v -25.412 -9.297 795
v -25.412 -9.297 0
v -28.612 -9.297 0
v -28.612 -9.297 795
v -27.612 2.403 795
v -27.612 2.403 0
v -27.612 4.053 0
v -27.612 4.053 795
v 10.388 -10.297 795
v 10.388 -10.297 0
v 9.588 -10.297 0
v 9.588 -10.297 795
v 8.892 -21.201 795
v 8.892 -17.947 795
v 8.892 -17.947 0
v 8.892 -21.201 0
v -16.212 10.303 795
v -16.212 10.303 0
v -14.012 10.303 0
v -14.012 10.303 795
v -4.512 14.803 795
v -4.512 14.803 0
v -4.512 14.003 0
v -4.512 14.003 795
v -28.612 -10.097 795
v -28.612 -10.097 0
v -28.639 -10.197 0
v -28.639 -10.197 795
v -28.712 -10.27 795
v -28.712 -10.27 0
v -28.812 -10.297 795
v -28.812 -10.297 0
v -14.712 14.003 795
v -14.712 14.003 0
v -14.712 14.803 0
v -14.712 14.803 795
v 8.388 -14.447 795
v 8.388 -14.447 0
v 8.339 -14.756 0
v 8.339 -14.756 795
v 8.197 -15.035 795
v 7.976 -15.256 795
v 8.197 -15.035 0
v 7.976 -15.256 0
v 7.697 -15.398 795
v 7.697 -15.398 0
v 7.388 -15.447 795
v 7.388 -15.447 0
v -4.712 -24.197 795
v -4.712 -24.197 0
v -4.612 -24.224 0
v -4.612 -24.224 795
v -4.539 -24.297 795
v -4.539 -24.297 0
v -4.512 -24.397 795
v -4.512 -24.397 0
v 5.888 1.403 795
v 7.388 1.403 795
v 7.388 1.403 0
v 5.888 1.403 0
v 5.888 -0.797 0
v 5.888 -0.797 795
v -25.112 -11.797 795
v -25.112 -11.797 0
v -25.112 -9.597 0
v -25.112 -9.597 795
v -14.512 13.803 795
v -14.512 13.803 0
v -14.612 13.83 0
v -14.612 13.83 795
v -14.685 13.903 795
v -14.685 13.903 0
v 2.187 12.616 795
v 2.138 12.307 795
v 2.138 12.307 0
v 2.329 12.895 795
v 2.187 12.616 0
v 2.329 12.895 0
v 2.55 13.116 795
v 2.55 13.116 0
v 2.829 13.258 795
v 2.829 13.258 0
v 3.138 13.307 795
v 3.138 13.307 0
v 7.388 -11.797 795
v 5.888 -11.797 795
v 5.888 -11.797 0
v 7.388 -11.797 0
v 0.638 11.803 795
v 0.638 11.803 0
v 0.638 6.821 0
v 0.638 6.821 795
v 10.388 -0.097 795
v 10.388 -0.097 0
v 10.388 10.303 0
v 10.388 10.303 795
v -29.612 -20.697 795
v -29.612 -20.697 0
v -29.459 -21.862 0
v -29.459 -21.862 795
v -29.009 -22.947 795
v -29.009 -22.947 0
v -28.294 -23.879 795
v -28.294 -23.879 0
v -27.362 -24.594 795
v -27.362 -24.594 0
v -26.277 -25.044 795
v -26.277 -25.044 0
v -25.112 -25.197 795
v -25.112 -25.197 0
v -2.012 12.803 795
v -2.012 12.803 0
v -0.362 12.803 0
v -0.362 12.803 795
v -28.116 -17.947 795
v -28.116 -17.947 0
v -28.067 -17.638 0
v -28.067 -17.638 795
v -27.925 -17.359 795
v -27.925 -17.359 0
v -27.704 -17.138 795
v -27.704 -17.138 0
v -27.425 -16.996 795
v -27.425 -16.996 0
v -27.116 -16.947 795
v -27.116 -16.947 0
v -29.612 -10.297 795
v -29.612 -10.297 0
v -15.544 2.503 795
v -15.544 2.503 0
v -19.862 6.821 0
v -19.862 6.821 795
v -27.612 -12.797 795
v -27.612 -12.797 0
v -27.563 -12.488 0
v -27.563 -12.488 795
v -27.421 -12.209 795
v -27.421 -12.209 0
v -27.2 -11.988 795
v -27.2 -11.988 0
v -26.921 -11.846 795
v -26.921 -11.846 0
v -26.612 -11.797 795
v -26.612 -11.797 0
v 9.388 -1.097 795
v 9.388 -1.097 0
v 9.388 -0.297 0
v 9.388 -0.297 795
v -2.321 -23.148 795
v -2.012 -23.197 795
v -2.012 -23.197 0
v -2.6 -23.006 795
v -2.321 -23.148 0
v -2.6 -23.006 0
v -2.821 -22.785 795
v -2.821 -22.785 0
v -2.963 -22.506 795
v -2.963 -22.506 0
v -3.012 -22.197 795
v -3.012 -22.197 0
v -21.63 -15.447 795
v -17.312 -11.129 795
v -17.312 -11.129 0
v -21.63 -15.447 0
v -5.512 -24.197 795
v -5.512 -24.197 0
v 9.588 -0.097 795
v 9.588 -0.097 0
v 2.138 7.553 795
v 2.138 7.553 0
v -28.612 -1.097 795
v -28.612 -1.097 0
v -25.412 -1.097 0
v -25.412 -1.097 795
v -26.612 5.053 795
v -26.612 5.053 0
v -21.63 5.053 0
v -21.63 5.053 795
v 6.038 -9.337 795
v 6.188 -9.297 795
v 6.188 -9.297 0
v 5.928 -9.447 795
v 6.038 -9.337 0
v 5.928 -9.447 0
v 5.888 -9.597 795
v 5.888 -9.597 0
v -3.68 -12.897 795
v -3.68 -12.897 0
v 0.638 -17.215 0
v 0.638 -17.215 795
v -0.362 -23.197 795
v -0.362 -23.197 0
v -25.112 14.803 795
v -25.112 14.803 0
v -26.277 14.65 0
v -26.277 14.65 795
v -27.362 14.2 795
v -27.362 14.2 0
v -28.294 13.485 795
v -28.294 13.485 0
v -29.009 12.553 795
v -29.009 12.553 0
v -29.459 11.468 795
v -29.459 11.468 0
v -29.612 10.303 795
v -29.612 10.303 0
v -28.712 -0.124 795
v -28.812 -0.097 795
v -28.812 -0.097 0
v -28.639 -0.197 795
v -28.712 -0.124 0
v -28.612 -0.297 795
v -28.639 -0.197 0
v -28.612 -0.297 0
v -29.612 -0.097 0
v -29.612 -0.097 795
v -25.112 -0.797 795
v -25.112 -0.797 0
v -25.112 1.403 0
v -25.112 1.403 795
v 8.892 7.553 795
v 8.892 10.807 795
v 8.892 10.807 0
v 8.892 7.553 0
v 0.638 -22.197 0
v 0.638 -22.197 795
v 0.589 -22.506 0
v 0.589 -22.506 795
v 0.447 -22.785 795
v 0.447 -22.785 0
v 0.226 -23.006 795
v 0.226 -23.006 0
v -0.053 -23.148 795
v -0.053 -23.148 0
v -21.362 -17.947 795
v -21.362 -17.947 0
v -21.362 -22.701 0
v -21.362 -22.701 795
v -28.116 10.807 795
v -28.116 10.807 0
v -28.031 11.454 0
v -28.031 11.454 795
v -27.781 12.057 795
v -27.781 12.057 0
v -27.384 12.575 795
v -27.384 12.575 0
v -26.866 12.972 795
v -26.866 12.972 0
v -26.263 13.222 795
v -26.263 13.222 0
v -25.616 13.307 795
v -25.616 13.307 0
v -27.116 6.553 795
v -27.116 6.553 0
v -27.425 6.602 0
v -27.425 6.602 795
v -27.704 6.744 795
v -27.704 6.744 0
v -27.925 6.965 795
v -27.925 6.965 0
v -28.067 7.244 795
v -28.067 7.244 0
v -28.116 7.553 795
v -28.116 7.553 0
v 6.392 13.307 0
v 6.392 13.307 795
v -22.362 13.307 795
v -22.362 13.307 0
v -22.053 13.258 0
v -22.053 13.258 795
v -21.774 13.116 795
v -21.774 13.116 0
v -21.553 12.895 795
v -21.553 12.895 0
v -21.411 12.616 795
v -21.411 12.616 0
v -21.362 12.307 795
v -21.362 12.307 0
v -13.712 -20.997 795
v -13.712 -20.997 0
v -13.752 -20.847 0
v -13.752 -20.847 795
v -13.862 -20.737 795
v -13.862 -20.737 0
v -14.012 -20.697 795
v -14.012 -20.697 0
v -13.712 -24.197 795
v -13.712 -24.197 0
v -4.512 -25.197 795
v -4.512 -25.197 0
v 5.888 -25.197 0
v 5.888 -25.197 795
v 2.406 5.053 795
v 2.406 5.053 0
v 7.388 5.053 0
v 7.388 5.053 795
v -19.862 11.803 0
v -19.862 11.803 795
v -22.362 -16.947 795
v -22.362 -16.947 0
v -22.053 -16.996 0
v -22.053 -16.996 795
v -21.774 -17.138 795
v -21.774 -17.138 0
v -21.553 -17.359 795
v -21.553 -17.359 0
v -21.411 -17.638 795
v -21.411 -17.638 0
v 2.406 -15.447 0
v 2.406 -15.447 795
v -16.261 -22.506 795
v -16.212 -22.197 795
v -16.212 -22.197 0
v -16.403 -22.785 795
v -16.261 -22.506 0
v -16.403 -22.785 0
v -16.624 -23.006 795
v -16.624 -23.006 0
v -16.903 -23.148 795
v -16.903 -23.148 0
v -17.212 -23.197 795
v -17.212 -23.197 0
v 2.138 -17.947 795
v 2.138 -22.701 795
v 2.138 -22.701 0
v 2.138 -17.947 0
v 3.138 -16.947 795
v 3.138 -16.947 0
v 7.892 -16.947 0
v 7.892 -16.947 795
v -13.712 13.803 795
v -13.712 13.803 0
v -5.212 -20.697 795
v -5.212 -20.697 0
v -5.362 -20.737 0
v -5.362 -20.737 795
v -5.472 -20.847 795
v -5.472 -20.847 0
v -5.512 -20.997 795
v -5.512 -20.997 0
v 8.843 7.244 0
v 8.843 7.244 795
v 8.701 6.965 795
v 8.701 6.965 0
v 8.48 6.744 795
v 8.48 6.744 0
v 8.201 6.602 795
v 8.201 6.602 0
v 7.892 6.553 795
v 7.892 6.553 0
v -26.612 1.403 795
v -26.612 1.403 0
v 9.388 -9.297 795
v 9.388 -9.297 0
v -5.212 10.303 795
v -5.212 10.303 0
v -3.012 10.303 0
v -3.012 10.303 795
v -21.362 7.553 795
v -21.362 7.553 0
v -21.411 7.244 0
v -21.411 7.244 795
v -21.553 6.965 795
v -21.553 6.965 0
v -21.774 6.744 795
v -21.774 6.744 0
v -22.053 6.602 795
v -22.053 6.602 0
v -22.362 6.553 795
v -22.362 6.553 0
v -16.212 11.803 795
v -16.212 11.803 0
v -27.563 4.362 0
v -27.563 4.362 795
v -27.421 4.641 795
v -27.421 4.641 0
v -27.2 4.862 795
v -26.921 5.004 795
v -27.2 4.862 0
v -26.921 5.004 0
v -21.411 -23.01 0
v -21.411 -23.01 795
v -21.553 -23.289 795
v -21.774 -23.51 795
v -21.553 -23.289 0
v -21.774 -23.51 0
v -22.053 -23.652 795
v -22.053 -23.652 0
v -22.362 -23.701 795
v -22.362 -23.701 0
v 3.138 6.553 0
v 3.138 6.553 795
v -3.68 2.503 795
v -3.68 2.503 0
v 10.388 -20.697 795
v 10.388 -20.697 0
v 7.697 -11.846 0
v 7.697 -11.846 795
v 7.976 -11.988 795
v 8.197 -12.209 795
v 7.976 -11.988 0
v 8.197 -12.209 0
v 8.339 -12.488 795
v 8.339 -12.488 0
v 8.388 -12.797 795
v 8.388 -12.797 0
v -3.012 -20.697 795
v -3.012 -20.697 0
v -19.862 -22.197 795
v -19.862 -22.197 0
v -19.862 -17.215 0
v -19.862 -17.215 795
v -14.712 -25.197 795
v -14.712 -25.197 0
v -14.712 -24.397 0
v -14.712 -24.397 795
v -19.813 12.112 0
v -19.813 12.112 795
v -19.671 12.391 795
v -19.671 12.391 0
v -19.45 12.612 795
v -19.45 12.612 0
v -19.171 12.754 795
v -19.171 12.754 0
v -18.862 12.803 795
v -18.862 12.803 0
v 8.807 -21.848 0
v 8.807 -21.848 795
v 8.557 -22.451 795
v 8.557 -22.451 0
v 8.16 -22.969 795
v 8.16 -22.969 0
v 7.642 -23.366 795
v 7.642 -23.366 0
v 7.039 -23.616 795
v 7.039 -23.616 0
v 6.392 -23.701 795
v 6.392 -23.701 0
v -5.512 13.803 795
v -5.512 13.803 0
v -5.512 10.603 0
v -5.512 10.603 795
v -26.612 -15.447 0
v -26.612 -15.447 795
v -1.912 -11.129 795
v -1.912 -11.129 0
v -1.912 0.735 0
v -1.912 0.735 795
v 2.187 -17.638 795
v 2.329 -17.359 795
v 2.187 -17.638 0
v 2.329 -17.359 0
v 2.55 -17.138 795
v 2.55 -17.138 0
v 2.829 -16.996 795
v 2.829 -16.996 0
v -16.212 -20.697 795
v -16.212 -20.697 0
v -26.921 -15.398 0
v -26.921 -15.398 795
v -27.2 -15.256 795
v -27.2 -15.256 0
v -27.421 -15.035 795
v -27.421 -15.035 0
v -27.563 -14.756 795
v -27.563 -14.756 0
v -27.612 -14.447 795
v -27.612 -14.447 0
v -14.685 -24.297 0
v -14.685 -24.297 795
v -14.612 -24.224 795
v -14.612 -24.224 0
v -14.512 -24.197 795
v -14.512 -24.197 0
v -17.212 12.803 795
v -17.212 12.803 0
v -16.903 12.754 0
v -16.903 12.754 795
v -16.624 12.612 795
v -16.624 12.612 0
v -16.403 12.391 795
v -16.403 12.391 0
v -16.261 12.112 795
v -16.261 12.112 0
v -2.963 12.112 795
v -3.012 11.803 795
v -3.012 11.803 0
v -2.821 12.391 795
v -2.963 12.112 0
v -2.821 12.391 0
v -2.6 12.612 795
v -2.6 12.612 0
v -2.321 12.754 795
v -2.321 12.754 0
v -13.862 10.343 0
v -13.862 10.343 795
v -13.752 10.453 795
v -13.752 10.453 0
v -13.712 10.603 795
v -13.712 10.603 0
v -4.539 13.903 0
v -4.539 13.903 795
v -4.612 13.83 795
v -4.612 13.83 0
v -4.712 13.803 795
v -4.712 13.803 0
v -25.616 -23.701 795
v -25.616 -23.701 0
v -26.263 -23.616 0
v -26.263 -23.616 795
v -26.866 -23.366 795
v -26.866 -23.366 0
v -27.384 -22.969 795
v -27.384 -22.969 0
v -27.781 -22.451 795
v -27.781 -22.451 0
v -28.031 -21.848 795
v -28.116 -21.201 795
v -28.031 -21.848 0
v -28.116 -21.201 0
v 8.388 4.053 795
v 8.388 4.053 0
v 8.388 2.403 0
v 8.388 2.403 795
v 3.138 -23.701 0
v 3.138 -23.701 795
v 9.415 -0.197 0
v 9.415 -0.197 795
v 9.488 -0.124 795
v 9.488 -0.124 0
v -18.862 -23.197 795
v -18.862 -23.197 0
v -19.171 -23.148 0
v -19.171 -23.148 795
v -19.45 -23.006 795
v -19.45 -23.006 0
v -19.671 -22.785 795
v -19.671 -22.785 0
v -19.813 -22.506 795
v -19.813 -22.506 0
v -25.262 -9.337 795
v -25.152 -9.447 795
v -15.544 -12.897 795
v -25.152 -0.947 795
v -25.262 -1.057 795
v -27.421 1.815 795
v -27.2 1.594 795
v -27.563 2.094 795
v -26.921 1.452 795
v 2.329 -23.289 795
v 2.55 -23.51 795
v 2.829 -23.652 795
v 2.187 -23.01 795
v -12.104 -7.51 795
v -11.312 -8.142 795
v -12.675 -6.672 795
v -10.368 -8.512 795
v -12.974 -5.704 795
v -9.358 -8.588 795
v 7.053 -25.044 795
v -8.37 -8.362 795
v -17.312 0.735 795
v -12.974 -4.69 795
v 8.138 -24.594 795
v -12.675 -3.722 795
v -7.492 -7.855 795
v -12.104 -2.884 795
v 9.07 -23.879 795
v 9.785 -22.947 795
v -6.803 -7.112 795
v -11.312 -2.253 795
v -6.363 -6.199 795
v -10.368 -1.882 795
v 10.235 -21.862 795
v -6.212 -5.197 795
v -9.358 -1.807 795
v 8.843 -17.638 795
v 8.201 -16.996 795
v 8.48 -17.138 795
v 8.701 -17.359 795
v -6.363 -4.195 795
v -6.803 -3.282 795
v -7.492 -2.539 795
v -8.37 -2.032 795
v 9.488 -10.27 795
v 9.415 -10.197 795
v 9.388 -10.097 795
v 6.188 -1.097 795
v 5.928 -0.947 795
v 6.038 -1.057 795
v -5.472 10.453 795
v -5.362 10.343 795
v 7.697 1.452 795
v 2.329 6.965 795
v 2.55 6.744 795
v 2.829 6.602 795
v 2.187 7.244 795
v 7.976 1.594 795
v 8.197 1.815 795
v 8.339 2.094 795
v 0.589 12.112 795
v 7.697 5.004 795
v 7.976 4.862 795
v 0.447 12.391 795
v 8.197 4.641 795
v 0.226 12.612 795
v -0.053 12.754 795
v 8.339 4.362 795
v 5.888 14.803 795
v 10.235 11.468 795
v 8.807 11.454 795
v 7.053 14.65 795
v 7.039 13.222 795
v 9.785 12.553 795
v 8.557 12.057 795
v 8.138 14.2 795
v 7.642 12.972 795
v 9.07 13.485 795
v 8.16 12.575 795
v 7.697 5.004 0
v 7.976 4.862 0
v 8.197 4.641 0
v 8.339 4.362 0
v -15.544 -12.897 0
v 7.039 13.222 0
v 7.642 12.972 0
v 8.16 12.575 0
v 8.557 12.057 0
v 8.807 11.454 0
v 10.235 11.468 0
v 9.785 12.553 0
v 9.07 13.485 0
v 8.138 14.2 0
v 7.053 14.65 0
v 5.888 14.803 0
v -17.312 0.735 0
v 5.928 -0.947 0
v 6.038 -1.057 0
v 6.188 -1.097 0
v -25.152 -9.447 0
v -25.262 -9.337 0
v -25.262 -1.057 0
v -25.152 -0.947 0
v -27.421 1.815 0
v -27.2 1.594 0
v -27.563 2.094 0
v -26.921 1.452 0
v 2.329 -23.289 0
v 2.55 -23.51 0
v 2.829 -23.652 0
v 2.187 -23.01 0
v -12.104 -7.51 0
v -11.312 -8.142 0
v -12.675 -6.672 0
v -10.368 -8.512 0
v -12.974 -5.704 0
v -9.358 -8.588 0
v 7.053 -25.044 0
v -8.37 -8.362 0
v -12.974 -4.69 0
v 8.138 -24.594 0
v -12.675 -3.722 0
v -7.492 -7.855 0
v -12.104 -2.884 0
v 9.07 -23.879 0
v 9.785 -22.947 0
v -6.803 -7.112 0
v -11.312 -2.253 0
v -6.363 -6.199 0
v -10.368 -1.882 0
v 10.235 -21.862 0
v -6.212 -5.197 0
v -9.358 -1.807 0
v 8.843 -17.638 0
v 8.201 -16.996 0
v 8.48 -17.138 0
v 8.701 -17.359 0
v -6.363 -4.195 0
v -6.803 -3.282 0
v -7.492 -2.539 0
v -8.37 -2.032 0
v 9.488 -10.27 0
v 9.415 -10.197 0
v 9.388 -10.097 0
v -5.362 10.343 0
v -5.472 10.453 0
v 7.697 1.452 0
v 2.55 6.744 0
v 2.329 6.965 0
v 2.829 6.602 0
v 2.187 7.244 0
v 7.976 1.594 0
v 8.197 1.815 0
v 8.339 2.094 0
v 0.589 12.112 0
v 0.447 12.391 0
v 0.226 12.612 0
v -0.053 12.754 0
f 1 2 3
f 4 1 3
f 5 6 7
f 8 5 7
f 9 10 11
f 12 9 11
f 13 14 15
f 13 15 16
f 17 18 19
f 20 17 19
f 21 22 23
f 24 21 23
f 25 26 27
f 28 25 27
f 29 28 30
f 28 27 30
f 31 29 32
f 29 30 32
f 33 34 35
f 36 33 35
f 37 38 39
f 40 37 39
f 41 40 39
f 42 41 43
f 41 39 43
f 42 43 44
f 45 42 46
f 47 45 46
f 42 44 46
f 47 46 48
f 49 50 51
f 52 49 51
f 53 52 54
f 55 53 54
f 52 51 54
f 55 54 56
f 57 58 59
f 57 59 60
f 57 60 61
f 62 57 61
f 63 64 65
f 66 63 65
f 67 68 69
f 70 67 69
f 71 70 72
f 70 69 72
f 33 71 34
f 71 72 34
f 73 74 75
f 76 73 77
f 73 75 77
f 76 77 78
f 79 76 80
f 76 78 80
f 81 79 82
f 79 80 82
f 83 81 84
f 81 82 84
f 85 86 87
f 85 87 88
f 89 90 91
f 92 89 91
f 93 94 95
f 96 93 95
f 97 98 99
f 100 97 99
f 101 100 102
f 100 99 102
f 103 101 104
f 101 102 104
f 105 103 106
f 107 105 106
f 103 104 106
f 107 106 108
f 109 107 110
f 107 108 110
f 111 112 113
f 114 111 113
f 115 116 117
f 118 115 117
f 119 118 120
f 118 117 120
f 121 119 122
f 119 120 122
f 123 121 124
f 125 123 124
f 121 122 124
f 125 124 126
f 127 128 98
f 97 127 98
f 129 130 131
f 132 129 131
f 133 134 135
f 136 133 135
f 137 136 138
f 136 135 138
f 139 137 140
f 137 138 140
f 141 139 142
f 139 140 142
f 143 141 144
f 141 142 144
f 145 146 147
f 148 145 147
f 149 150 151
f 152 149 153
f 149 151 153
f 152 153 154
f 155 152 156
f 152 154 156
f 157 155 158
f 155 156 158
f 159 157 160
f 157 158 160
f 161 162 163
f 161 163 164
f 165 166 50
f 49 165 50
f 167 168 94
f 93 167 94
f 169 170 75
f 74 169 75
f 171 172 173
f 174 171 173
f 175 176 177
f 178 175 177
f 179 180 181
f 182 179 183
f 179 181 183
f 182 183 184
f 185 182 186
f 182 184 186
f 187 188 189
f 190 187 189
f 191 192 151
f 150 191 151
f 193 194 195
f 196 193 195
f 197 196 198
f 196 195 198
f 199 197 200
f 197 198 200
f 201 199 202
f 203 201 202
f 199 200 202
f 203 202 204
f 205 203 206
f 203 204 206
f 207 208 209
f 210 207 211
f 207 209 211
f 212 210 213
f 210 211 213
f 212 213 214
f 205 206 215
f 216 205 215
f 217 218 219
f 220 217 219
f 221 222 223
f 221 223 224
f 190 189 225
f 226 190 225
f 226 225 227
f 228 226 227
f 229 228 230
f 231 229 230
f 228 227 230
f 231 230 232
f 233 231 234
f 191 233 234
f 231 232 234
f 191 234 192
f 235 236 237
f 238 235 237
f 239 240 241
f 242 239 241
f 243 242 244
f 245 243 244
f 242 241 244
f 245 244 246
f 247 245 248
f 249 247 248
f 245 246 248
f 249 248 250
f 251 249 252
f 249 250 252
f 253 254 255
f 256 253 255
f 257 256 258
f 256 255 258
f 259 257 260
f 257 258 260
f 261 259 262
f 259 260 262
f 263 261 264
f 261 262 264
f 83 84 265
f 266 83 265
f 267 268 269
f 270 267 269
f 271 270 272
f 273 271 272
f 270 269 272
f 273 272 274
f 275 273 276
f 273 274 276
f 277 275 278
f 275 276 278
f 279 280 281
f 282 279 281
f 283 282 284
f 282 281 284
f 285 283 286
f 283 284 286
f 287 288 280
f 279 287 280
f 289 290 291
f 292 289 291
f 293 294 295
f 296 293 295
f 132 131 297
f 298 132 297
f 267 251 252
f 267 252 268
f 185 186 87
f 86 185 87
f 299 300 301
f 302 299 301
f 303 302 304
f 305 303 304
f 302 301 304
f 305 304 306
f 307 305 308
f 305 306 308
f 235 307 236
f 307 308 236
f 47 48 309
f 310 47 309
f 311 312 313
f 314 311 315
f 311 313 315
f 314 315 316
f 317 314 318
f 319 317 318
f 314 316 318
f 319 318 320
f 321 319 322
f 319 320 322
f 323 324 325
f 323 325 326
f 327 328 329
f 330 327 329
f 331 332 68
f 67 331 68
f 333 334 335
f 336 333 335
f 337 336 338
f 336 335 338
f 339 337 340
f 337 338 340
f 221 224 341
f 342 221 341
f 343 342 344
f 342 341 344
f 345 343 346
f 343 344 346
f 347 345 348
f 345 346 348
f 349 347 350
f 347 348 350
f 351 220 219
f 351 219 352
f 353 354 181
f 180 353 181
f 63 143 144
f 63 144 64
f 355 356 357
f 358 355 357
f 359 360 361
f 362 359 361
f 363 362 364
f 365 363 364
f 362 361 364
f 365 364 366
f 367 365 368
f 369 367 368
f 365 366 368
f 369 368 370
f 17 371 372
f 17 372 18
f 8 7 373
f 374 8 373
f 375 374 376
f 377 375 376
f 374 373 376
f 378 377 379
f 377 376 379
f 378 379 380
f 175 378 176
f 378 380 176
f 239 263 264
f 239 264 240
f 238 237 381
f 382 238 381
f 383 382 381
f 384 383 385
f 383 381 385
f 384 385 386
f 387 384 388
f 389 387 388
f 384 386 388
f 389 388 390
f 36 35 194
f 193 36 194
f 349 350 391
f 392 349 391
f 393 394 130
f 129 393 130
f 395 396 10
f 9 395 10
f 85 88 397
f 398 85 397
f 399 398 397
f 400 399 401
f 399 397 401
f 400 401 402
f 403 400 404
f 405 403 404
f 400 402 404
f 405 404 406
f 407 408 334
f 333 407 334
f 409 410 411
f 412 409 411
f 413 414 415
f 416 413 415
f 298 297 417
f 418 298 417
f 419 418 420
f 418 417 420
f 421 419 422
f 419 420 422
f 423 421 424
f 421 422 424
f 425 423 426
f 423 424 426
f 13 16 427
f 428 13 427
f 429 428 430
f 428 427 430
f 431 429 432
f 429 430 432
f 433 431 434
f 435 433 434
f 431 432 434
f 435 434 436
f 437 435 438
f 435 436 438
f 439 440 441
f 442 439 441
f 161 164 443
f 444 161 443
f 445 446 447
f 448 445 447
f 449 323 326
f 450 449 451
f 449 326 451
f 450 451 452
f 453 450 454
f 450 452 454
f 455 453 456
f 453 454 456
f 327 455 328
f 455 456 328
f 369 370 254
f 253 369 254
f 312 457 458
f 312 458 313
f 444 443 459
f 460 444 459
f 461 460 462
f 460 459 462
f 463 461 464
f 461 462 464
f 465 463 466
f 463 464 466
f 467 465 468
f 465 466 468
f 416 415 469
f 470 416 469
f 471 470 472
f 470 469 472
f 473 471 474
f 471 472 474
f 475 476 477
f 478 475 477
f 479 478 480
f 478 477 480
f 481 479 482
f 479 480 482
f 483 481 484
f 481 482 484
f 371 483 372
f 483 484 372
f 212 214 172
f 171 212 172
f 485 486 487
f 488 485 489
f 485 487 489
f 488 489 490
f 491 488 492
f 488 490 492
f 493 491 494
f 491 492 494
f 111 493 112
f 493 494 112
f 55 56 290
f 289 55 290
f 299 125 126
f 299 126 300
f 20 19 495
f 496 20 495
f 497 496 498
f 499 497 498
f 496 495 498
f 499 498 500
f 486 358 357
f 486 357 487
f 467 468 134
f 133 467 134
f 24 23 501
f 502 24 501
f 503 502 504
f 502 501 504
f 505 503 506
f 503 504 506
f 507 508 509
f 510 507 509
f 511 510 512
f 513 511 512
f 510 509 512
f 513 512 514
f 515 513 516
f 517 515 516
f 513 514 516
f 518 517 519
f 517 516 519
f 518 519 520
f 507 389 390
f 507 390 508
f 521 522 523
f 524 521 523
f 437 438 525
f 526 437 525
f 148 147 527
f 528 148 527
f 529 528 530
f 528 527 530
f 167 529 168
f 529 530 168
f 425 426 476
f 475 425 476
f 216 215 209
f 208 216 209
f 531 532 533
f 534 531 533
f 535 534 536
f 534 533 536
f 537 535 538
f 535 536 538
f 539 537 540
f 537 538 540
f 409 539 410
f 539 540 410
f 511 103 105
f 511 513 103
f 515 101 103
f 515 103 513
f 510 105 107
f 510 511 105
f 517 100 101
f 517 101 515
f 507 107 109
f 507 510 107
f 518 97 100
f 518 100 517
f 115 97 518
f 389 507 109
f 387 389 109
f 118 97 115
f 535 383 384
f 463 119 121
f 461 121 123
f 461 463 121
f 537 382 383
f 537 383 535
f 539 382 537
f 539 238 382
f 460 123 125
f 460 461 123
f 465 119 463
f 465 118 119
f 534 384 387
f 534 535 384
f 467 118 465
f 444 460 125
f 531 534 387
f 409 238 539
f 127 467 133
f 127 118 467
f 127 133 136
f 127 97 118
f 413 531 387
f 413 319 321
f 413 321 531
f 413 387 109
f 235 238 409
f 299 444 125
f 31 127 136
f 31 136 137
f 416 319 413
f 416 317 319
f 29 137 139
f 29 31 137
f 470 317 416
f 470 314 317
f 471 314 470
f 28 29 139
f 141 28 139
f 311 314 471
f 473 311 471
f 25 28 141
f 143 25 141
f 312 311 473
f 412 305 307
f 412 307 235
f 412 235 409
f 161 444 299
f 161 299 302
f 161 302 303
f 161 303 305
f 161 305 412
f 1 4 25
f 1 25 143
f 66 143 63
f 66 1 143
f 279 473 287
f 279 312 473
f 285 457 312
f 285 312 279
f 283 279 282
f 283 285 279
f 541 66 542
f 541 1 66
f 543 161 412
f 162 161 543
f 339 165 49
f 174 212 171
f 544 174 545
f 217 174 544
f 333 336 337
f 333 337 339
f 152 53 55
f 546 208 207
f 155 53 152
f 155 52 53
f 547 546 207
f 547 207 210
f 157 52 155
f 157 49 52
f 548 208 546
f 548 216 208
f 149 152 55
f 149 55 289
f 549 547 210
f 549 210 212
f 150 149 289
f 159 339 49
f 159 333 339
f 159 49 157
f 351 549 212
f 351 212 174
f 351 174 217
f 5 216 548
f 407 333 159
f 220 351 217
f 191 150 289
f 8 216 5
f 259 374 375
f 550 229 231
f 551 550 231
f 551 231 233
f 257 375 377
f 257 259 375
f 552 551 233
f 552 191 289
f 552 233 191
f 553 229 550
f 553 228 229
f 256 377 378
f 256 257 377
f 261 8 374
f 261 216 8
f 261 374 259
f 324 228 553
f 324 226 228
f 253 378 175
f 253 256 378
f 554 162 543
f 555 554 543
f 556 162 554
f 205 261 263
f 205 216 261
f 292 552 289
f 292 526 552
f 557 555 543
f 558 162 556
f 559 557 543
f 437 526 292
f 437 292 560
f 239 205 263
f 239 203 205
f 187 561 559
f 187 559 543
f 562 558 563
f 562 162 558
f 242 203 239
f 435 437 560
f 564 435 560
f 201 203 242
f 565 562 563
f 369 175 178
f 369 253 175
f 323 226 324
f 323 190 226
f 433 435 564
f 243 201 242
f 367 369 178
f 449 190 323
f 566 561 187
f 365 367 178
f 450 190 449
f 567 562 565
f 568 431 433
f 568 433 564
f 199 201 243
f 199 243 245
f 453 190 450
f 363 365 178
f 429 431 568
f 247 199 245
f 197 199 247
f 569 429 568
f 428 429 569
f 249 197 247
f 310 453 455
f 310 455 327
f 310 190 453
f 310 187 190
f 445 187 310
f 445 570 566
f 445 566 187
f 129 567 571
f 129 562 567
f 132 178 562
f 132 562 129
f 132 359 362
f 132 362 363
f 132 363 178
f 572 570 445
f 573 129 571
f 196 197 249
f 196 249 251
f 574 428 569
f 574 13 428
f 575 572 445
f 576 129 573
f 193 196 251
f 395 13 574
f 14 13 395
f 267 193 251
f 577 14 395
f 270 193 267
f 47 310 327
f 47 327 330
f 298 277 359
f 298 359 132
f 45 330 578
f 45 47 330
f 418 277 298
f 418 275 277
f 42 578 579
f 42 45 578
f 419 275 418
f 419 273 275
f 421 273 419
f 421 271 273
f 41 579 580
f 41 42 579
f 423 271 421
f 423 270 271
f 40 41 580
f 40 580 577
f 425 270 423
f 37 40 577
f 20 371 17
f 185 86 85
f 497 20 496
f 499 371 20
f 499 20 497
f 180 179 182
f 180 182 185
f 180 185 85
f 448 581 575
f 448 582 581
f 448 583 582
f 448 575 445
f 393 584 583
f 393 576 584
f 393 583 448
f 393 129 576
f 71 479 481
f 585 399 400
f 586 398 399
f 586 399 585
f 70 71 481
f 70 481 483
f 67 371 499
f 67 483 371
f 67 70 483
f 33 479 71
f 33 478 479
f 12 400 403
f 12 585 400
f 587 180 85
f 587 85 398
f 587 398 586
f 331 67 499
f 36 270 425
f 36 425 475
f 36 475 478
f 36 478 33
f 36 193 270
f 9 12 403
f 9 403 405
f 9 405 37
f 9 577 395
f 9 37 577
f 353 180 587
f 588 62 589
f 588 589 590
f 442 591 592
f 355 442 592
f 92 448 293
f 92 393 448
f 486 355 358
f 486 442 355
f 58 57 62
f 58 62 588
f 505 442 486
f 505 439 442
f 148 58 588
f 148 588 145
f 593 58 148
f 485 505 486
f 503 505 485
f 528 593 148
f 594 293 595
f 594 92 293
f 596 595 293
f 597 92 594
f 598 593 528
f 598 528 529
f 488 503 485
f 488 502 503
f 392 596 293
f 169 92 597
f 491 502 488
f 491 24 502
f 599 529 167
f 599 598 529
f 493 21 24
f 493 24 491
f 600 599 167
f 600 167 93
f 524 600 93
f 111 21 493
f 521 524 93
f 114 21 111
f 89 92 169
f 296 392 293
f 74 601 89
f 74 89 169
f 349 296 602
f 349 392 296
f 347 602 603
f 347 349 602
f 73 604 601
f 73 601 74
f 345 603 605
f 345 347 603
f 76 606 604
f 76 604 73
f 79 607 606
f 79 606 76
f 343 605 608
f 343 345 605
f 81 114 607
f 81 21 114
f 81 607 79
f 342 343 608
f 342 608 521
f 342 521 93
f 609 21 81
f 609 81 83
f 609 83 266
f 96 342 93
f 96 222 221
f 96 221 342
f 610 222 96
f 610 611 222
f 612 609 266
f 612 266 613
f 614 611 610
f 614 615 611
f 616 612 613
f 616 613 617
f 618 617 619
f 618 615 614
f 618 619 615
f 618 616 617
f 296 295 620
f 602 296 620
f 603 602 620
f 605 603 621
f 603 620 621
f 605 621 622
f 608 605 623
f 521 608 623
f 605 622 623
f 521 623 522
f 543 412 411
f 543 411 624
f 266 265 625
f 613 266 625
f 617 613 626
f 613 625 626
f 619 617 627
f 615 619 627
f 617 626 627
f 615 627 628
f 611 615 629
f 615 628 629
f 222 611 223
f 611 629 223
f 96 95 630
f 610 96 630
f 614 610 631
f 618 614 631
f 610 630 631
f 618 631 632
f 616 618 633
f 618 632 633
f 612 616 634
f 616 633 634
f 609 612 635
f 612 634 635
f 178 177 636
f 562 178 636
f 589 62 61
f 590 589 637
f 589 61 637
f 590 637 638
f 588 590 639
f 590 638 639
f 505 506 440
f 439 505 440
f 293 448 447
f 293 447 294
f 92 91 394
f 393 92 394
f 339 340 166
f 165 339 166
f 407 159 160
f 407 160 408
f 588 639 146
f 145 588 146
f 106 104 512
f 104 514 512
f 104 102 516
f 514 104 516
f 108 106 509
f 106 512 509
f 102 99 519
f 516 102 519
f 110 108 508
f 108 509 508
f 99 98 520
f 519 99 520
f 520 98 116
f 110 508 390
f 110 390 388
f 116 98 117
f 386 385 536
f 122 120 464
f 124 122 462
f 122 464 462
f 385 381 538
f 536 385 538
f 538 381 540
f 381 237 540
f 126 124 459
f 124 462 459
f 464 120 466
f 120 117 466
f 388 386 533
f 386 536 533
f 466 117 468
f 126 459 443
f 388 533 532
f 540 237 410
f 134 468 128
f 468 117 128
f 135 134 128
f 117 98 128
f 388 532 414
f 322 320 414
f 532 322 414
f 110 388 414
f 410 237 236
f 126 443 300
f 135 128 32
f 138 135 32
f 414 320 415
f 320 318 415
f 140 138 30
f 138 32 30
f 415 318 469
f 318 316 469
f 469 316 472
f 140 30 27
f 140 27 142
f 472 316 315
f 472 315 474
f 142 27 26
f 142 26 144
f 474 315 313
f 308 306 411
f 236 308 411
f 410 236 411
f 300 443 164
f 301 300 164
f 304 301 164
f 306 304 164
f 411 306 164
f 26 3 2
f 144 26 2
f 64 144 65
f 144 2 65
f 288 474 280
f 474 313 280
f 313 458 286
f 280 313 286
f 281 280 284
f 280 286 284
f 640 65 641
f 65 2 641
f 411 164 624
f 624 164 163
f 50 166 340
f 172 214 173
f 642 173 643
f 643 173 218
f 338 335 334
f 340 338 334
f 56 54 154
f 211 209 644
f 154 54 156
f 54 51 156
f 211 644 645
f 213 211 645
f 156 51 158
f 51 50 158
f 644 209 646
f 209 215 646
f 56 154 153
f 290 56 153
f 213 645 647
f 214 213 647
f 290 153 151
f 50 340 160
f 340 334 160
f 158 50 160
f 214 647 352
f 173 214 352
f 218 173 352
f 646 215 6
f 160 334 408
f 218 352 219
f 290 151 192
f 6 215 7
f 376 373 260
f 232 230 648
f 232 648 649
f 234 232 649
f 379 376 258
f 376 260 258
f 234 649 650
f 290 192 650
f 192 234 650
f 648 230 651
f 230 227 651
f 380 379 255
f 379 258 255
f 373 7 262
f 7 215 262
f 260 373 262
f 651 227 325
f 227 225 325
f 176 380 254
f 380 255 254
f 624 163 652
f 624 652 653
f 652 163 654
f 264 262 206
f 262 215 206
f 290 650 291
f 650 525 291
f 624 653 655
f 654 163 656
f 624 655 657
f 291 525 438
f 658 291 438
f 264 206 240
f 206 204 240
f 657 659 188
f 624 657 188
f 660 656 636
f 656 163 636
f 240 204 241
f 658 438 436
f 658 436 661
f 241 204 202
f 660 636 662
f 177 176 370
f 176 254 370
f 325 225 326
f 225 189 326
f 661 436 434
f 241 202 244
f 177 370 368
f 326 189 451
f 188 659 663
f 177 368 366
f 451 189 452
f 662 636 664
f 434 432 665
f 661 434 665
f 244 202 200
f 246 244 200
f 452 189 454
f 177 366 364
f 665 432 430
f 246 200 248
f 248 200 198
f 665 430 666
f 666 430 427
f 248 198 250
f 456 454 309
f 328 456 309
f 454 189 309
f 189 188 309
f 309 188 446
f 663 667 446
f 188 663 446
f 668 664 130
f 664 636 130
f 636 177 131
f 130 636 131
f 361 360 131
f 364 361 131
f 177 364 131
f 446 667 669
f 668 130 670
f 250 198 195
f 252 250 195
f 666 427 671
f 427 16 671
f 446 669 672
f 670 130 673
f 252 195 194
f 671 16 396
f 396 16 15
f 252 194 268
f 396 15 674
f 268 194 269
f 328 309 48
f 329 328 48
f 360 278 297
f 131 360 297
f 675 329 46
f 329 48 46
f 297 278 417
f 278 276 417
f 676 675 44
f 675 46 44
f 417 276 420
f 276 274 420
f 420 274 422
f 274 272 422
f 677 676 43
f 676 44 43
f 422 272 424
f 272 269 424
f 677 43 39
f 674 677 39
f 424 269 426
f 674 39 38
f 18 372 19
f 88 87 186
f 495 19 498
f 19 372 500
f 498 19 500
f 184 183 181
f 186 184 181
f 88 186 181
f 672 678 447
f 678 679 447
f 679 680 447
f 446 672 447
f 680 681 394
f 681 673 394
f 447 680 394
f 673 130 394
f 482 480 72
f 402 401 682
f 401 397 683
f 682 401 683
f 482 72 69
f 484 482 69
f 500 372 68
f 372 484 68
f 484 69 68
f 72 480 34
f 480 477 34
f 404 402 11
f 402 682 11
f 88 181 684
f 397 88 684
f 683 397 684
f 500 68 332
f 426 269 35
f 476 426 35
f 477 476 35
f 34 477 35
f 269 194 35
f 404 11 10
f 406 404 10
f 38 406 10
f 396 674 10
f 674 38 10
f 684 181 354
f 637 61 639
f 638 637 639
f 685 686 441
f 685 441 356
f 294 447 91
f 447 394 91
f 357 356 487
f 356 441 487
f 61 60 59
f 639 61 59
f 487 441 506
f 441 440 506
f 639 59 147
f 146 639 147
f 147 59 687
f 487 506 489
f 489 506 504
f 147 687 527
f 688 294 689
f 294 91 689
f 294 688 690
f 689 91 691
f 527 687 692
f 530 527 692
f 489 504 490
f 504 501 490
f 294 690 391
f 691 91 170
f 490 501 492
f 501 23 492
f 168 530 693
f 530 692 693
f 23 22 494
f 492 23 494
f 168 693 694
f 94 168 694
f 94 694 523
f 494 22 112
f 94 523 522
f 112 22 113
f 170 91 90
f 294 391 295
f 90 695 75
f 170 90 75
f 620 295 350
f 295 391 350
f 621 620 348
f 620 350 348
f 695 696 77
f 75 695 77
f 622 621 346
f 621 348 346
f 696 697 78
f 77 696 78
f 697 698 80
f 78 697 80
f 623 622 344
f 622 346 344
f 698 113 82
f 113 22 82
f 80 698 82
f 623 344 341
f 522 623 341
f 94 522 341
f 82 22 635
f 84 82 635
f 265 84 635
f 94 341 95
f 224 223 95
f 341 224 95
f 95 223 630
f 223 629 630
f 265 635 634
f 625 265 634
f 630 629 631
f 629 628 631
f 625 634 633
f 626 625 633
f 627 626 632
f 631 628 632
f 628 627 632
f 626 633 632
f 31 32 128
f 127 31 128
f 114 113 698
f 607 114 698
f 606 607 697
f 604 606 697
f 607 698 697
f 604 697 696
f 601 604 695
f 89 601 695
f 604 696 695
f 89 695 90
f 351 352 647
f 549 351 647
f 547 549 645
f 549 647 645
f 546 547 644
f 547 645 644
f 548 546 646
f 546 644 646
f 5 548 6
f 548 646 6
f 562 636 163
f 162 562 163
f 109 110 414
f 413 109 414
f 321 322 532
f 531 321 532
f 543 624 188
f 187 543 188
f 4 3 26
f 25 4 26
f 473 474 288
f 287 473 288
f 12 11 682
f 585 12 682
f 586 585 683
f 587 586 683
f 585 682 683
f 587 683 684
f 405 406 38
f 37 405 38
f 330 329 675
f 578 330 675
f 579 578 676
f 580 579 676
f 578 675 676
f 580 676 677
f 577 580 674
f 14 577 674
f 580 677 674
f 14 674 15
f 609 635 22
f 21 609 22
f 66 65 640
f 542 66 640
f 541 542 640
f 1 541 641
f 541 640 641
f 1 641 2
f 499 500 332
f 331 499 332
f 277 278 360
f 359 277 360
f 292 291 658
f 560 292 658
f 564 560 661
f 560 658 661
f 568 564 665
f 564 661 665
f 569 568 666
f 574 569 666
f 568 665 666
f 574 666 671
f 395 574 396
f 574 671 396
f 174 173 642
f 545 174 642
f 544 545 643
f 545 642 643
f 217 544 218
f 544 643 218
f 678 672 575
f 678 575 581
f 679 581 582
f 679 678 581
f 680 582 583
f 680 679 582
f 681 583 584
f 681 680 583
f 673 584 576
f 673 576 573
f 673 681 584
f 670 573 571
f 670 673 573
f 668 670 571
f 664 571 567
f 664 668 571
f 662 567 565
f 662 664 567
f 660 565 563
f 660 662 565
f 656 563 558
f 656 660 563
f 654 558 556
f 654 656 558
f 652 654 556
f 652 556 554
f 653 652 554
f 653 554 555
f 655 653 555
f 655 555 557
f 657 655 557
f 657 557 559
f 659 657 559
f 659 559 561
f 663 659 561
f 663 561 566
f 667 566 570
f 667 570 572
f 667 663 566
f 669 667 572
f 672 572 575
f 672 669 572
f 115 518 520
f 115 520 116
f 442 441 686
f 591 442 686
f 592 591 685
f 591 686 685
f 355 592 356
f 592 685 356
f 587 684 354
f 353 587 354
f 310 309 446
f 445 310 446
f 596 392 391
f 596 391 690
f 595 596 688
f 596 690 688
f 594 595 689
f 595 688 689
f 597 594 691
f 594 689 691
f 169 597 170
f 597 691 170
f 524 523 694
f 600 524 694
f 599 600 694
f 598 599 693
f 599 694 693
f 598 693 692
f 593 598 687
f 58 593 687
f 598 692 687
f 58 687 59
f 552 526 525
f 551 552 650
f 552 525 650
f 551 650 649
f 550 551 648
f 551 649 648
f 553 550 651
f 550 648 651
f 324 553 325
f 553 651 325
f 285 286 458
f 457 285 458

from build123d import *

# Parameters (mm, degrees)
SKETCH_1_R      = 3.4
EXTRUDE_1_DEPTH = 795


with BuildPart() as part:
    # 草图1 → 凸台-拉伸1 (new body)
    with BuildSketch(Plane.XY):
        with BuildLine():
            Line((-1.911920332, 0.735190406), (2.405846621, 5.052957359))
            Line((2.405846621, 5.052957359), (7.388079668, 5.052957359))
            ThreePointArc((7.388079668, 5.052957359), (8.09518645, 4.76006414), (8.388079668, 4.052957359))
            Line((8.388079668, 4.052957359), (8.388079668, 2.402957359))
            ThreePointArc((8.388079668, 2.402957359), (8.09518645, 1.695850578), (7.388079668, 1.402957359))
            Line((7.388079668, 1.402957359), (5.888079668, 1.402957359))
            Line((5.888079668, 1.402957359), (5.888079668, -0.797042641))
            ThreePointArc((5.888079668, -0.797042641), (5.975947634, -1.009174675), (6.188079668, -1.097042641))
            Line((6.188079668, -1.097042641), (9.388079668, -1.097042641))
            Line((9.388079668, -1.097042641), (9.388079668, -0.297042641))
            ThreePointArc((9.388079668, -0.297042641), (9.446658312, -0.155621285), (9.588079668, -0.097042641))
            Line((9.588079668, -0.097042641), (10.388079668, -0.097042641))
            Line((10.388079668, -0.097042641), (10.388079668, 10.302957359))
            ThreePointArc((10.388079668, 10.302957359), (9.070060184, 13.484937874), (5.888079668, 14.802957359))
            Line((5.888079668, 14.802957359), (-4.511920332, 14.802957359))
            Line((-4.511920332, 14.802957359), (-4.511920332, 14.002957359))
            ThreePointArc((-4.511920332, 14.002957359), (-4.570498975, 13.861536003), (-4.711920332, 13.802957359))
            Line((-4.711920332, 13.802957359), (-5.511920332, 13.802957359))
            Line((-5.511920332, 13.802957359), (-5.511920332, 10.602957359))
            ThreePointArc((-5.511920332, 10.602957359), (-5.424052366, 10.390825325), (-5.211920332, 10.302957359))
            Line((-5.211920332, 10.302957359), (-3.011920332, 10.302957359))
            Line((-3.011920332, 10.302957359), (-3.011920332, 11.802957359))
            ThreePointArc((-3.011920332, 11.802957359), (-2.719027113, 12.51006414), (-2.011920332, 12.802957359))
            Line((-2.011920332, 12.802957359), (-0.361920332, 12.802957359))
            ThreePointArc((-0.361920332, 12.802957359), (0.34518645, 12.51006414), (0.638079668, 11.802957359))
            Line((0.638079668, 11.802957359), (0.638079668, 6.820724312))
            Line((0.638079668, 6.820724312), (-3.679687285, 2.502957359))
            Line((-3.679687285, 2.502957359), (-15.544153379, 2.502957359))
            Line((-15.544153379, 2.502957359), (-19.861920332, 6.820724312))
            Line((-19.861920332, 6.820724312), (-19.861920332, 11.802957359))
            ThreePointArc((-19.861920332, 11.802957359), (-19.569027113, 12.51006414), (-18.861920332, 12.802957359))
            Line((-18.861920332, 12.802957359), (-17.211920332, 12.802957359))
            ThreePointArc((-17.211920332, 12.802957359), (-16.50481355, 12.51006414), (-16.211920332, 11.802957359))
            Line((-16.211920332, 11.802957359), (-16.211920332, 10.302957359))
            Line((-16.211920332, 10.302957359), (-14.011920332, 10.302957359))
            ThreePointArc((-14.011920332, 10.302957359), (-13.799788297, 10.390825325), (-13.711920332, 10.602957359))
            Line((-13.711920332, 10.602957359), (-13.711920332, 13.802957359))
            Line((-13.711920332, 13.802957359), (-14.511920332, 13.802957359))
            ThreePointArc((-14.511920332, 13.802957359), (-14.653341688, 13.861536003), (-14.711920332, 14.002957359))
            Line((-14.711920332, 14.002957359), (-14.711920332, 14.802957359))
            Line((-14.711920332, 14.802957359), (-25.111920332, 14.802957359))
            ThreePointArc((-25.111920332, 14.802957359), (-28.293900847, 13.484937874), (-29.611920332, 10.302957359))
            Line((-29.611920332, 10.302957359), (-29.611920332, -0.097042641))
            Line((-29.611920332, -0.097042641), (-28.811920332, -0.097042641))
            ThreePointArc((-28.811920332, -0.097042641), (-28.670498975, -0.155621285), (-28.611920332, -0.297042641))
            Line((-28.611920332, -0.297042641), (-28.611920332, -1.097042641))
            Line((-28.611920332, -1.097042641), (-25.411920332, -1.097042641))
            ThreePointArc((-25.411920332, -1.097042641), (-25.199788297, -1.009174675), (-25.111920332, -0.797042641))
            Line((-25.111920332, -0.797042641), (-25.111920332, 1.402957359))
            Line((-25.111920332, 1.402957359), (-26.611920332, 1.402957359))
            ThreePointArc((-26.611920332, 1.402957359), (-27.319027113, 1.695850578), (-27.611920332, 2.402957359))
            Line((-27.611920332, 2.402957359), (-27.611920332, 4.052957359))
            ThreePointArc((-27.611920332, 4.052957359), (-27.319027113, 4.76006414), (-26.611920332, 5.052957359))
            Line((-26.611920332, 5.052957359), (-21.629687285, 5.052957359))
            Line((-21.629687285, 5.052957359), (-17.311920332, 0.735190406))
            Line((-17.311920332, 0.735190406), (-17.311920332, -11.129275688))
            Line((-17.311920332, -11.129275688), (-21.629687285, -15.447042641))
            Line((-21.629687285, -15.447042641), (-26.611920332, -15.447042641))
            ThreePointArc((-26.611920332, -15.447042641), (-27.319027113, -15.154149422), (-27.611920332, -14.447042641))
            Line((-27.611920332, -14.447042641), (-27.611920332, -12.797042641))
            ThreePointArc((-27.611920332, -12.797042641), (-27.319027113, -12.08993586), (-26.611920332, -11.797042641))
            Line((-26.611920332, -11.797042641), (-25.111920332, -11.797042641))
            Line((-25.111920332, -11.797042641), (-25.111920332, -9.597042641))
            ThreePointArc((-25.111920332, -9.597042641), (-25.199788297, -9.384910607), (-25.411920332, -9.297042641))
            Line((-25.411920332, -9.297042641), (-28.611920332, -9.297042641))
            Line((-28.611920332, -9.297042641), (-28.611920332, -10.097042641))
            ThreePointArc((-28.611920332, -10.097042641), (-28.670498975, -10.238463997), (-28.811920332, -10.297042641))
            Line((-28.811920332, -10.297042641), (-29.611920332, -10.297042641))
            Line((-29.611920332, -10.297042641), (-29.611920332, -20.697042641))
            ThreePointArc((-29.611920332, -20.697042641), (-28.293900847, -23.879023156), (-25.111920332, -25.197042641))
            Line((-25.111920332, -25.197042641), (-14.711920332, -25.197042641))
            Line((-14.711920332, -25.197042641), (-14.711920332, -24.397042641))
            ThreePointArc((-14.711920332, -24.397042641), (-14.653341688, -24.255621285), (-14.511920332, -24.197042641))
            Line((-14.511920332, -24.197042641), (-13.711920332, -24.197042641))
            Line((-13.711920332, -24.197042641), (-13.711920332, -20.997042641))
            ThreePointArc((-13.711920332, -20.997042641), (-13.799788297, -20.784910607), (-14.011920332, -20.697042641))
            Line((-14.011920332, -20.697042641), (-16.211920332, -20.697042641))
            Line((-16.211920332, -20.697042641), (-16.211920332, -22.197042641))
            ThreePointArc((-16.211920332, -22.197042641), (-16.50481355, -22.904149422), (-17.211920332, -23.197042641))
            Line((-17.211920332, -23.197042641), (-18.861920332, -23.197042641))
            ThreePointArc((-18.861920332, -23.197042641), (-19.569027113, -22.904149422), (-19.861920332, -22.197042641))
            Line((-19.861920332, -22.197042641), (-19.861920332, -17.214809594))
            Line((-19.861920332, -17.214809594), (-15.544153379, -12.897042641))
            Line((-15.544153379, -12.897042641), (-3.679687285, -12.897042641))
            Line((-3.679687285, -12.897042641), (0.638079668, -17.214809594))
            Line((0.638079668, -17.214809594), (0.638079668, -22.197042641))
            ThreePointArc((0.638079668, -22.197042641), (0.34518645, -22.904149422), (-0.361920332, -23.197042641))
            Line((-0.361920332, -23.197042641), (-2.011920332, -23.197042641))
            ThreePointArc((-2.011920332, -23.197042641), (-2.719027113, -22.904149422), (-3.011920332, -22.197042641))
            Line((-3.011920332, -22.197042641), (-3.011920332, -20.697042641))
            Line((-3.011920332, -20.697042641), (-5.211920332, -20.697042641))
            ThreePointArc((-5.211920332, -20.697042641), (-5.424052366, -20.784910607), (-5.511920332, -20.997042641))
            Line((-5.511920332, -20.997042641), (-5.511920332, -24.197042641))
            Line((-5.511920332, -24.197042641), (-4.711920332, -24.197042641))
            ThreePointArc((-4.711920332, -24.197042641), (-4.570498975, -24.255621285), (-4.511920332, -24.397042641))
            Line((-4.511920332, -24.397042641), (-4.511920332, -25.197042641))
            Line((-4.511920332, -25.197042641), (5.888079668, -25.197042641))
            ThreePointArc((5.888079668, -25.197042641), (9.070060184, -23.879023156), (10.388079668, -20.697042641))
            Line((10.388079668, -20.697042641), (10.388079668, -10.297042641))
            Line((10.388079668, -10.297042641), (9.588079668, -10.297042641))
            ThreePointArc((9.588079668, -10.297042641), (9.446658312, -10.238463997), (9.388079668, -10.097042641))
            Line((9.388079668, -10.097042641), (9.388079668, -9.297042641))
            Line((9.388079668, -9.297042641), (6.188079668, -9.297042641))
            ThreePointArc((6.188079668, -9.297042641), (5.975947634, -9.384910607), (5.888079668, -9.597042641))
            Line((5.888079668, -9.597042641), (5.888079668, -11.797042641))
            Line((5.888079668, -11.797042641), (7.388079668, -11.797042641))
            ThreePointArc((7.388079668, -11.797042641), (8.09518645, -12.08993586), (8.388079668, -12.797042641))
            Line((8.388079668, -12.797042641), (8.388079668, -14.447042641))
            ThreePointArc((8.388079668, -14.447042641), (8.09518645, -15.154149422), (7.388079668, -15.447042641))
            Line((7.388079668, -15.447042641), (2.405846621, -15.447042641))
            Line((2.405846621, -15.447042641), (-1.911920332, -11.129275688))
            Line((-1.911920332, -11.129275688), (-1.911920332, 0.735190406))
        make_face()
        with Locations((-9.611920332, -5.197042641)):
            Circle(SKETCH_1_R, mode=Mode.SUBTRACT)
        with BuildLine():
            Line((3.138079668, -16.947042641), (7.892079668, -16.947042641))
            ThreePointArc((7.892079668, -16.947042641), (8.59918645, -17.23993586), (8.892079668, -17.947042641))
            Line((8.892079668, -17.947042641), (8.892079668, -21.201042641))
            ThreePointArc((8.892079668, -21.201042641), (8.159846621, -22.968809594), (6.392079668, -23.701042641))
            Line((6.392079668, -23.701042641), (3.138079668, -23.701042641))
            ThreePointArc((3.138079668, -23.701042641), (2.430972887, -23.408149422), (2.138079668, -22.701042641))
            Line((2.138079668, -22.701042641), (2.138079668, -17.947042641))
            ThreePointArc((2.138079668, -17.947042641), (2.430972887, -17.23993586), (3.138079668, -16.947042641))
        make_face(mode=Mode.SUBTRACT)
        with BuildLine():
            Line((-21.361920332, -17.947042641), (-21.361920332, -22.701042641))
            ThreePointArc((-21.361920332, -22.701042641), (-21.65481355, -23.408149422), (-22.361920332, -23.701042641))
            Line((-22.361920332, -23.701042641), (-25.615920332, -23.701042641))
            ThreePointArc((-25.615920332, -23.701042641), (-27.383687285, -22.968809594), (-28.115920332, -21.201042641))
            Line((-28.115920332, -21.201042641), (-28.115920332, -17.947042641))
            ThreePointArc((-28.115920332, -17.947042641), (-27.823027113, -17.23993586), (-27.115920332, -16.947042641))
            Line((-27.115920332, -16.947042641), (-22.361920332, -16.947042641))
            ThreePointArc((-22.361920332, -16.947042641), (-21.65481355, -17.23993586), (-21.361920332, -17.947042641))
        make_face(mode=Mode.SUBTRACT)
        with BuildLine():
            Line((2.138079668, 7.552957359), (2.138079668, 12.306957359))
            ThreePointArc((2.138079668, 12.306957359), (2.430972887, 13.01406414), (3.138079668, 13.306957359))
            Line((3.138079668, 13.306957359), (6.392079668, 13.306957359))
            ThreePointArc((6.392079668, 13.306957359), (8.159846621, 12.574724312), (8.892079668, 10.806957359))
            Line((8.892079668, 10.806957359), (8.892079668, 7.552957359))
            ThreePointArc((8.892079668, 7.552957359), (8.59918645, 6.845850578), (7.892079668, 6.552957359))
            Line((7.892079668, 6.552957359), (3.138079668, 6.552957359))
            ThreePointArc((3.138079668, 6.552957359), (2.430972887, 6.845850578), (2.138079668, 7.552957359))
        make_face(mode=Mode.SUBTRACT)
        with BuildLine():
            Line((-22.361920332, 6.552957359), (-27.115920332, 6.552957359))
            ThreePointArc((-27.115920332, 6.552957359), (-27.823027113, 6.845850578), (-28.115920332, 7.552957359))
            Line((-28.115920332, 7.552957359), (-28.115920332, 10.806957359))
            ThreePointArc((-28.115920332, 10.806957359), (-27.383687285, 12.574724312), (-25.615920332, 13.306957359))
            Line((-25.615920332, 13.306957359), (-22.361920332, 13.306957359))
            ThreePointArc((-22.361920332, 13.306957359), (-21.65481355, 13.01406414), (-21.361920332, 12.306957359))
            Line((-21.361920332, 12.306957359), (-21.361920332, 7.552957359))
            ThreePointArc((-21.361920332, 7.552957359), (-21.65481355, 6.845850578), (-22.361920332, 6.552957359))
        make_face(mode=Mode.SUBTRACT)
    extrude(amount=EXTRUDE_1_DEPTH)


solid = part.part
